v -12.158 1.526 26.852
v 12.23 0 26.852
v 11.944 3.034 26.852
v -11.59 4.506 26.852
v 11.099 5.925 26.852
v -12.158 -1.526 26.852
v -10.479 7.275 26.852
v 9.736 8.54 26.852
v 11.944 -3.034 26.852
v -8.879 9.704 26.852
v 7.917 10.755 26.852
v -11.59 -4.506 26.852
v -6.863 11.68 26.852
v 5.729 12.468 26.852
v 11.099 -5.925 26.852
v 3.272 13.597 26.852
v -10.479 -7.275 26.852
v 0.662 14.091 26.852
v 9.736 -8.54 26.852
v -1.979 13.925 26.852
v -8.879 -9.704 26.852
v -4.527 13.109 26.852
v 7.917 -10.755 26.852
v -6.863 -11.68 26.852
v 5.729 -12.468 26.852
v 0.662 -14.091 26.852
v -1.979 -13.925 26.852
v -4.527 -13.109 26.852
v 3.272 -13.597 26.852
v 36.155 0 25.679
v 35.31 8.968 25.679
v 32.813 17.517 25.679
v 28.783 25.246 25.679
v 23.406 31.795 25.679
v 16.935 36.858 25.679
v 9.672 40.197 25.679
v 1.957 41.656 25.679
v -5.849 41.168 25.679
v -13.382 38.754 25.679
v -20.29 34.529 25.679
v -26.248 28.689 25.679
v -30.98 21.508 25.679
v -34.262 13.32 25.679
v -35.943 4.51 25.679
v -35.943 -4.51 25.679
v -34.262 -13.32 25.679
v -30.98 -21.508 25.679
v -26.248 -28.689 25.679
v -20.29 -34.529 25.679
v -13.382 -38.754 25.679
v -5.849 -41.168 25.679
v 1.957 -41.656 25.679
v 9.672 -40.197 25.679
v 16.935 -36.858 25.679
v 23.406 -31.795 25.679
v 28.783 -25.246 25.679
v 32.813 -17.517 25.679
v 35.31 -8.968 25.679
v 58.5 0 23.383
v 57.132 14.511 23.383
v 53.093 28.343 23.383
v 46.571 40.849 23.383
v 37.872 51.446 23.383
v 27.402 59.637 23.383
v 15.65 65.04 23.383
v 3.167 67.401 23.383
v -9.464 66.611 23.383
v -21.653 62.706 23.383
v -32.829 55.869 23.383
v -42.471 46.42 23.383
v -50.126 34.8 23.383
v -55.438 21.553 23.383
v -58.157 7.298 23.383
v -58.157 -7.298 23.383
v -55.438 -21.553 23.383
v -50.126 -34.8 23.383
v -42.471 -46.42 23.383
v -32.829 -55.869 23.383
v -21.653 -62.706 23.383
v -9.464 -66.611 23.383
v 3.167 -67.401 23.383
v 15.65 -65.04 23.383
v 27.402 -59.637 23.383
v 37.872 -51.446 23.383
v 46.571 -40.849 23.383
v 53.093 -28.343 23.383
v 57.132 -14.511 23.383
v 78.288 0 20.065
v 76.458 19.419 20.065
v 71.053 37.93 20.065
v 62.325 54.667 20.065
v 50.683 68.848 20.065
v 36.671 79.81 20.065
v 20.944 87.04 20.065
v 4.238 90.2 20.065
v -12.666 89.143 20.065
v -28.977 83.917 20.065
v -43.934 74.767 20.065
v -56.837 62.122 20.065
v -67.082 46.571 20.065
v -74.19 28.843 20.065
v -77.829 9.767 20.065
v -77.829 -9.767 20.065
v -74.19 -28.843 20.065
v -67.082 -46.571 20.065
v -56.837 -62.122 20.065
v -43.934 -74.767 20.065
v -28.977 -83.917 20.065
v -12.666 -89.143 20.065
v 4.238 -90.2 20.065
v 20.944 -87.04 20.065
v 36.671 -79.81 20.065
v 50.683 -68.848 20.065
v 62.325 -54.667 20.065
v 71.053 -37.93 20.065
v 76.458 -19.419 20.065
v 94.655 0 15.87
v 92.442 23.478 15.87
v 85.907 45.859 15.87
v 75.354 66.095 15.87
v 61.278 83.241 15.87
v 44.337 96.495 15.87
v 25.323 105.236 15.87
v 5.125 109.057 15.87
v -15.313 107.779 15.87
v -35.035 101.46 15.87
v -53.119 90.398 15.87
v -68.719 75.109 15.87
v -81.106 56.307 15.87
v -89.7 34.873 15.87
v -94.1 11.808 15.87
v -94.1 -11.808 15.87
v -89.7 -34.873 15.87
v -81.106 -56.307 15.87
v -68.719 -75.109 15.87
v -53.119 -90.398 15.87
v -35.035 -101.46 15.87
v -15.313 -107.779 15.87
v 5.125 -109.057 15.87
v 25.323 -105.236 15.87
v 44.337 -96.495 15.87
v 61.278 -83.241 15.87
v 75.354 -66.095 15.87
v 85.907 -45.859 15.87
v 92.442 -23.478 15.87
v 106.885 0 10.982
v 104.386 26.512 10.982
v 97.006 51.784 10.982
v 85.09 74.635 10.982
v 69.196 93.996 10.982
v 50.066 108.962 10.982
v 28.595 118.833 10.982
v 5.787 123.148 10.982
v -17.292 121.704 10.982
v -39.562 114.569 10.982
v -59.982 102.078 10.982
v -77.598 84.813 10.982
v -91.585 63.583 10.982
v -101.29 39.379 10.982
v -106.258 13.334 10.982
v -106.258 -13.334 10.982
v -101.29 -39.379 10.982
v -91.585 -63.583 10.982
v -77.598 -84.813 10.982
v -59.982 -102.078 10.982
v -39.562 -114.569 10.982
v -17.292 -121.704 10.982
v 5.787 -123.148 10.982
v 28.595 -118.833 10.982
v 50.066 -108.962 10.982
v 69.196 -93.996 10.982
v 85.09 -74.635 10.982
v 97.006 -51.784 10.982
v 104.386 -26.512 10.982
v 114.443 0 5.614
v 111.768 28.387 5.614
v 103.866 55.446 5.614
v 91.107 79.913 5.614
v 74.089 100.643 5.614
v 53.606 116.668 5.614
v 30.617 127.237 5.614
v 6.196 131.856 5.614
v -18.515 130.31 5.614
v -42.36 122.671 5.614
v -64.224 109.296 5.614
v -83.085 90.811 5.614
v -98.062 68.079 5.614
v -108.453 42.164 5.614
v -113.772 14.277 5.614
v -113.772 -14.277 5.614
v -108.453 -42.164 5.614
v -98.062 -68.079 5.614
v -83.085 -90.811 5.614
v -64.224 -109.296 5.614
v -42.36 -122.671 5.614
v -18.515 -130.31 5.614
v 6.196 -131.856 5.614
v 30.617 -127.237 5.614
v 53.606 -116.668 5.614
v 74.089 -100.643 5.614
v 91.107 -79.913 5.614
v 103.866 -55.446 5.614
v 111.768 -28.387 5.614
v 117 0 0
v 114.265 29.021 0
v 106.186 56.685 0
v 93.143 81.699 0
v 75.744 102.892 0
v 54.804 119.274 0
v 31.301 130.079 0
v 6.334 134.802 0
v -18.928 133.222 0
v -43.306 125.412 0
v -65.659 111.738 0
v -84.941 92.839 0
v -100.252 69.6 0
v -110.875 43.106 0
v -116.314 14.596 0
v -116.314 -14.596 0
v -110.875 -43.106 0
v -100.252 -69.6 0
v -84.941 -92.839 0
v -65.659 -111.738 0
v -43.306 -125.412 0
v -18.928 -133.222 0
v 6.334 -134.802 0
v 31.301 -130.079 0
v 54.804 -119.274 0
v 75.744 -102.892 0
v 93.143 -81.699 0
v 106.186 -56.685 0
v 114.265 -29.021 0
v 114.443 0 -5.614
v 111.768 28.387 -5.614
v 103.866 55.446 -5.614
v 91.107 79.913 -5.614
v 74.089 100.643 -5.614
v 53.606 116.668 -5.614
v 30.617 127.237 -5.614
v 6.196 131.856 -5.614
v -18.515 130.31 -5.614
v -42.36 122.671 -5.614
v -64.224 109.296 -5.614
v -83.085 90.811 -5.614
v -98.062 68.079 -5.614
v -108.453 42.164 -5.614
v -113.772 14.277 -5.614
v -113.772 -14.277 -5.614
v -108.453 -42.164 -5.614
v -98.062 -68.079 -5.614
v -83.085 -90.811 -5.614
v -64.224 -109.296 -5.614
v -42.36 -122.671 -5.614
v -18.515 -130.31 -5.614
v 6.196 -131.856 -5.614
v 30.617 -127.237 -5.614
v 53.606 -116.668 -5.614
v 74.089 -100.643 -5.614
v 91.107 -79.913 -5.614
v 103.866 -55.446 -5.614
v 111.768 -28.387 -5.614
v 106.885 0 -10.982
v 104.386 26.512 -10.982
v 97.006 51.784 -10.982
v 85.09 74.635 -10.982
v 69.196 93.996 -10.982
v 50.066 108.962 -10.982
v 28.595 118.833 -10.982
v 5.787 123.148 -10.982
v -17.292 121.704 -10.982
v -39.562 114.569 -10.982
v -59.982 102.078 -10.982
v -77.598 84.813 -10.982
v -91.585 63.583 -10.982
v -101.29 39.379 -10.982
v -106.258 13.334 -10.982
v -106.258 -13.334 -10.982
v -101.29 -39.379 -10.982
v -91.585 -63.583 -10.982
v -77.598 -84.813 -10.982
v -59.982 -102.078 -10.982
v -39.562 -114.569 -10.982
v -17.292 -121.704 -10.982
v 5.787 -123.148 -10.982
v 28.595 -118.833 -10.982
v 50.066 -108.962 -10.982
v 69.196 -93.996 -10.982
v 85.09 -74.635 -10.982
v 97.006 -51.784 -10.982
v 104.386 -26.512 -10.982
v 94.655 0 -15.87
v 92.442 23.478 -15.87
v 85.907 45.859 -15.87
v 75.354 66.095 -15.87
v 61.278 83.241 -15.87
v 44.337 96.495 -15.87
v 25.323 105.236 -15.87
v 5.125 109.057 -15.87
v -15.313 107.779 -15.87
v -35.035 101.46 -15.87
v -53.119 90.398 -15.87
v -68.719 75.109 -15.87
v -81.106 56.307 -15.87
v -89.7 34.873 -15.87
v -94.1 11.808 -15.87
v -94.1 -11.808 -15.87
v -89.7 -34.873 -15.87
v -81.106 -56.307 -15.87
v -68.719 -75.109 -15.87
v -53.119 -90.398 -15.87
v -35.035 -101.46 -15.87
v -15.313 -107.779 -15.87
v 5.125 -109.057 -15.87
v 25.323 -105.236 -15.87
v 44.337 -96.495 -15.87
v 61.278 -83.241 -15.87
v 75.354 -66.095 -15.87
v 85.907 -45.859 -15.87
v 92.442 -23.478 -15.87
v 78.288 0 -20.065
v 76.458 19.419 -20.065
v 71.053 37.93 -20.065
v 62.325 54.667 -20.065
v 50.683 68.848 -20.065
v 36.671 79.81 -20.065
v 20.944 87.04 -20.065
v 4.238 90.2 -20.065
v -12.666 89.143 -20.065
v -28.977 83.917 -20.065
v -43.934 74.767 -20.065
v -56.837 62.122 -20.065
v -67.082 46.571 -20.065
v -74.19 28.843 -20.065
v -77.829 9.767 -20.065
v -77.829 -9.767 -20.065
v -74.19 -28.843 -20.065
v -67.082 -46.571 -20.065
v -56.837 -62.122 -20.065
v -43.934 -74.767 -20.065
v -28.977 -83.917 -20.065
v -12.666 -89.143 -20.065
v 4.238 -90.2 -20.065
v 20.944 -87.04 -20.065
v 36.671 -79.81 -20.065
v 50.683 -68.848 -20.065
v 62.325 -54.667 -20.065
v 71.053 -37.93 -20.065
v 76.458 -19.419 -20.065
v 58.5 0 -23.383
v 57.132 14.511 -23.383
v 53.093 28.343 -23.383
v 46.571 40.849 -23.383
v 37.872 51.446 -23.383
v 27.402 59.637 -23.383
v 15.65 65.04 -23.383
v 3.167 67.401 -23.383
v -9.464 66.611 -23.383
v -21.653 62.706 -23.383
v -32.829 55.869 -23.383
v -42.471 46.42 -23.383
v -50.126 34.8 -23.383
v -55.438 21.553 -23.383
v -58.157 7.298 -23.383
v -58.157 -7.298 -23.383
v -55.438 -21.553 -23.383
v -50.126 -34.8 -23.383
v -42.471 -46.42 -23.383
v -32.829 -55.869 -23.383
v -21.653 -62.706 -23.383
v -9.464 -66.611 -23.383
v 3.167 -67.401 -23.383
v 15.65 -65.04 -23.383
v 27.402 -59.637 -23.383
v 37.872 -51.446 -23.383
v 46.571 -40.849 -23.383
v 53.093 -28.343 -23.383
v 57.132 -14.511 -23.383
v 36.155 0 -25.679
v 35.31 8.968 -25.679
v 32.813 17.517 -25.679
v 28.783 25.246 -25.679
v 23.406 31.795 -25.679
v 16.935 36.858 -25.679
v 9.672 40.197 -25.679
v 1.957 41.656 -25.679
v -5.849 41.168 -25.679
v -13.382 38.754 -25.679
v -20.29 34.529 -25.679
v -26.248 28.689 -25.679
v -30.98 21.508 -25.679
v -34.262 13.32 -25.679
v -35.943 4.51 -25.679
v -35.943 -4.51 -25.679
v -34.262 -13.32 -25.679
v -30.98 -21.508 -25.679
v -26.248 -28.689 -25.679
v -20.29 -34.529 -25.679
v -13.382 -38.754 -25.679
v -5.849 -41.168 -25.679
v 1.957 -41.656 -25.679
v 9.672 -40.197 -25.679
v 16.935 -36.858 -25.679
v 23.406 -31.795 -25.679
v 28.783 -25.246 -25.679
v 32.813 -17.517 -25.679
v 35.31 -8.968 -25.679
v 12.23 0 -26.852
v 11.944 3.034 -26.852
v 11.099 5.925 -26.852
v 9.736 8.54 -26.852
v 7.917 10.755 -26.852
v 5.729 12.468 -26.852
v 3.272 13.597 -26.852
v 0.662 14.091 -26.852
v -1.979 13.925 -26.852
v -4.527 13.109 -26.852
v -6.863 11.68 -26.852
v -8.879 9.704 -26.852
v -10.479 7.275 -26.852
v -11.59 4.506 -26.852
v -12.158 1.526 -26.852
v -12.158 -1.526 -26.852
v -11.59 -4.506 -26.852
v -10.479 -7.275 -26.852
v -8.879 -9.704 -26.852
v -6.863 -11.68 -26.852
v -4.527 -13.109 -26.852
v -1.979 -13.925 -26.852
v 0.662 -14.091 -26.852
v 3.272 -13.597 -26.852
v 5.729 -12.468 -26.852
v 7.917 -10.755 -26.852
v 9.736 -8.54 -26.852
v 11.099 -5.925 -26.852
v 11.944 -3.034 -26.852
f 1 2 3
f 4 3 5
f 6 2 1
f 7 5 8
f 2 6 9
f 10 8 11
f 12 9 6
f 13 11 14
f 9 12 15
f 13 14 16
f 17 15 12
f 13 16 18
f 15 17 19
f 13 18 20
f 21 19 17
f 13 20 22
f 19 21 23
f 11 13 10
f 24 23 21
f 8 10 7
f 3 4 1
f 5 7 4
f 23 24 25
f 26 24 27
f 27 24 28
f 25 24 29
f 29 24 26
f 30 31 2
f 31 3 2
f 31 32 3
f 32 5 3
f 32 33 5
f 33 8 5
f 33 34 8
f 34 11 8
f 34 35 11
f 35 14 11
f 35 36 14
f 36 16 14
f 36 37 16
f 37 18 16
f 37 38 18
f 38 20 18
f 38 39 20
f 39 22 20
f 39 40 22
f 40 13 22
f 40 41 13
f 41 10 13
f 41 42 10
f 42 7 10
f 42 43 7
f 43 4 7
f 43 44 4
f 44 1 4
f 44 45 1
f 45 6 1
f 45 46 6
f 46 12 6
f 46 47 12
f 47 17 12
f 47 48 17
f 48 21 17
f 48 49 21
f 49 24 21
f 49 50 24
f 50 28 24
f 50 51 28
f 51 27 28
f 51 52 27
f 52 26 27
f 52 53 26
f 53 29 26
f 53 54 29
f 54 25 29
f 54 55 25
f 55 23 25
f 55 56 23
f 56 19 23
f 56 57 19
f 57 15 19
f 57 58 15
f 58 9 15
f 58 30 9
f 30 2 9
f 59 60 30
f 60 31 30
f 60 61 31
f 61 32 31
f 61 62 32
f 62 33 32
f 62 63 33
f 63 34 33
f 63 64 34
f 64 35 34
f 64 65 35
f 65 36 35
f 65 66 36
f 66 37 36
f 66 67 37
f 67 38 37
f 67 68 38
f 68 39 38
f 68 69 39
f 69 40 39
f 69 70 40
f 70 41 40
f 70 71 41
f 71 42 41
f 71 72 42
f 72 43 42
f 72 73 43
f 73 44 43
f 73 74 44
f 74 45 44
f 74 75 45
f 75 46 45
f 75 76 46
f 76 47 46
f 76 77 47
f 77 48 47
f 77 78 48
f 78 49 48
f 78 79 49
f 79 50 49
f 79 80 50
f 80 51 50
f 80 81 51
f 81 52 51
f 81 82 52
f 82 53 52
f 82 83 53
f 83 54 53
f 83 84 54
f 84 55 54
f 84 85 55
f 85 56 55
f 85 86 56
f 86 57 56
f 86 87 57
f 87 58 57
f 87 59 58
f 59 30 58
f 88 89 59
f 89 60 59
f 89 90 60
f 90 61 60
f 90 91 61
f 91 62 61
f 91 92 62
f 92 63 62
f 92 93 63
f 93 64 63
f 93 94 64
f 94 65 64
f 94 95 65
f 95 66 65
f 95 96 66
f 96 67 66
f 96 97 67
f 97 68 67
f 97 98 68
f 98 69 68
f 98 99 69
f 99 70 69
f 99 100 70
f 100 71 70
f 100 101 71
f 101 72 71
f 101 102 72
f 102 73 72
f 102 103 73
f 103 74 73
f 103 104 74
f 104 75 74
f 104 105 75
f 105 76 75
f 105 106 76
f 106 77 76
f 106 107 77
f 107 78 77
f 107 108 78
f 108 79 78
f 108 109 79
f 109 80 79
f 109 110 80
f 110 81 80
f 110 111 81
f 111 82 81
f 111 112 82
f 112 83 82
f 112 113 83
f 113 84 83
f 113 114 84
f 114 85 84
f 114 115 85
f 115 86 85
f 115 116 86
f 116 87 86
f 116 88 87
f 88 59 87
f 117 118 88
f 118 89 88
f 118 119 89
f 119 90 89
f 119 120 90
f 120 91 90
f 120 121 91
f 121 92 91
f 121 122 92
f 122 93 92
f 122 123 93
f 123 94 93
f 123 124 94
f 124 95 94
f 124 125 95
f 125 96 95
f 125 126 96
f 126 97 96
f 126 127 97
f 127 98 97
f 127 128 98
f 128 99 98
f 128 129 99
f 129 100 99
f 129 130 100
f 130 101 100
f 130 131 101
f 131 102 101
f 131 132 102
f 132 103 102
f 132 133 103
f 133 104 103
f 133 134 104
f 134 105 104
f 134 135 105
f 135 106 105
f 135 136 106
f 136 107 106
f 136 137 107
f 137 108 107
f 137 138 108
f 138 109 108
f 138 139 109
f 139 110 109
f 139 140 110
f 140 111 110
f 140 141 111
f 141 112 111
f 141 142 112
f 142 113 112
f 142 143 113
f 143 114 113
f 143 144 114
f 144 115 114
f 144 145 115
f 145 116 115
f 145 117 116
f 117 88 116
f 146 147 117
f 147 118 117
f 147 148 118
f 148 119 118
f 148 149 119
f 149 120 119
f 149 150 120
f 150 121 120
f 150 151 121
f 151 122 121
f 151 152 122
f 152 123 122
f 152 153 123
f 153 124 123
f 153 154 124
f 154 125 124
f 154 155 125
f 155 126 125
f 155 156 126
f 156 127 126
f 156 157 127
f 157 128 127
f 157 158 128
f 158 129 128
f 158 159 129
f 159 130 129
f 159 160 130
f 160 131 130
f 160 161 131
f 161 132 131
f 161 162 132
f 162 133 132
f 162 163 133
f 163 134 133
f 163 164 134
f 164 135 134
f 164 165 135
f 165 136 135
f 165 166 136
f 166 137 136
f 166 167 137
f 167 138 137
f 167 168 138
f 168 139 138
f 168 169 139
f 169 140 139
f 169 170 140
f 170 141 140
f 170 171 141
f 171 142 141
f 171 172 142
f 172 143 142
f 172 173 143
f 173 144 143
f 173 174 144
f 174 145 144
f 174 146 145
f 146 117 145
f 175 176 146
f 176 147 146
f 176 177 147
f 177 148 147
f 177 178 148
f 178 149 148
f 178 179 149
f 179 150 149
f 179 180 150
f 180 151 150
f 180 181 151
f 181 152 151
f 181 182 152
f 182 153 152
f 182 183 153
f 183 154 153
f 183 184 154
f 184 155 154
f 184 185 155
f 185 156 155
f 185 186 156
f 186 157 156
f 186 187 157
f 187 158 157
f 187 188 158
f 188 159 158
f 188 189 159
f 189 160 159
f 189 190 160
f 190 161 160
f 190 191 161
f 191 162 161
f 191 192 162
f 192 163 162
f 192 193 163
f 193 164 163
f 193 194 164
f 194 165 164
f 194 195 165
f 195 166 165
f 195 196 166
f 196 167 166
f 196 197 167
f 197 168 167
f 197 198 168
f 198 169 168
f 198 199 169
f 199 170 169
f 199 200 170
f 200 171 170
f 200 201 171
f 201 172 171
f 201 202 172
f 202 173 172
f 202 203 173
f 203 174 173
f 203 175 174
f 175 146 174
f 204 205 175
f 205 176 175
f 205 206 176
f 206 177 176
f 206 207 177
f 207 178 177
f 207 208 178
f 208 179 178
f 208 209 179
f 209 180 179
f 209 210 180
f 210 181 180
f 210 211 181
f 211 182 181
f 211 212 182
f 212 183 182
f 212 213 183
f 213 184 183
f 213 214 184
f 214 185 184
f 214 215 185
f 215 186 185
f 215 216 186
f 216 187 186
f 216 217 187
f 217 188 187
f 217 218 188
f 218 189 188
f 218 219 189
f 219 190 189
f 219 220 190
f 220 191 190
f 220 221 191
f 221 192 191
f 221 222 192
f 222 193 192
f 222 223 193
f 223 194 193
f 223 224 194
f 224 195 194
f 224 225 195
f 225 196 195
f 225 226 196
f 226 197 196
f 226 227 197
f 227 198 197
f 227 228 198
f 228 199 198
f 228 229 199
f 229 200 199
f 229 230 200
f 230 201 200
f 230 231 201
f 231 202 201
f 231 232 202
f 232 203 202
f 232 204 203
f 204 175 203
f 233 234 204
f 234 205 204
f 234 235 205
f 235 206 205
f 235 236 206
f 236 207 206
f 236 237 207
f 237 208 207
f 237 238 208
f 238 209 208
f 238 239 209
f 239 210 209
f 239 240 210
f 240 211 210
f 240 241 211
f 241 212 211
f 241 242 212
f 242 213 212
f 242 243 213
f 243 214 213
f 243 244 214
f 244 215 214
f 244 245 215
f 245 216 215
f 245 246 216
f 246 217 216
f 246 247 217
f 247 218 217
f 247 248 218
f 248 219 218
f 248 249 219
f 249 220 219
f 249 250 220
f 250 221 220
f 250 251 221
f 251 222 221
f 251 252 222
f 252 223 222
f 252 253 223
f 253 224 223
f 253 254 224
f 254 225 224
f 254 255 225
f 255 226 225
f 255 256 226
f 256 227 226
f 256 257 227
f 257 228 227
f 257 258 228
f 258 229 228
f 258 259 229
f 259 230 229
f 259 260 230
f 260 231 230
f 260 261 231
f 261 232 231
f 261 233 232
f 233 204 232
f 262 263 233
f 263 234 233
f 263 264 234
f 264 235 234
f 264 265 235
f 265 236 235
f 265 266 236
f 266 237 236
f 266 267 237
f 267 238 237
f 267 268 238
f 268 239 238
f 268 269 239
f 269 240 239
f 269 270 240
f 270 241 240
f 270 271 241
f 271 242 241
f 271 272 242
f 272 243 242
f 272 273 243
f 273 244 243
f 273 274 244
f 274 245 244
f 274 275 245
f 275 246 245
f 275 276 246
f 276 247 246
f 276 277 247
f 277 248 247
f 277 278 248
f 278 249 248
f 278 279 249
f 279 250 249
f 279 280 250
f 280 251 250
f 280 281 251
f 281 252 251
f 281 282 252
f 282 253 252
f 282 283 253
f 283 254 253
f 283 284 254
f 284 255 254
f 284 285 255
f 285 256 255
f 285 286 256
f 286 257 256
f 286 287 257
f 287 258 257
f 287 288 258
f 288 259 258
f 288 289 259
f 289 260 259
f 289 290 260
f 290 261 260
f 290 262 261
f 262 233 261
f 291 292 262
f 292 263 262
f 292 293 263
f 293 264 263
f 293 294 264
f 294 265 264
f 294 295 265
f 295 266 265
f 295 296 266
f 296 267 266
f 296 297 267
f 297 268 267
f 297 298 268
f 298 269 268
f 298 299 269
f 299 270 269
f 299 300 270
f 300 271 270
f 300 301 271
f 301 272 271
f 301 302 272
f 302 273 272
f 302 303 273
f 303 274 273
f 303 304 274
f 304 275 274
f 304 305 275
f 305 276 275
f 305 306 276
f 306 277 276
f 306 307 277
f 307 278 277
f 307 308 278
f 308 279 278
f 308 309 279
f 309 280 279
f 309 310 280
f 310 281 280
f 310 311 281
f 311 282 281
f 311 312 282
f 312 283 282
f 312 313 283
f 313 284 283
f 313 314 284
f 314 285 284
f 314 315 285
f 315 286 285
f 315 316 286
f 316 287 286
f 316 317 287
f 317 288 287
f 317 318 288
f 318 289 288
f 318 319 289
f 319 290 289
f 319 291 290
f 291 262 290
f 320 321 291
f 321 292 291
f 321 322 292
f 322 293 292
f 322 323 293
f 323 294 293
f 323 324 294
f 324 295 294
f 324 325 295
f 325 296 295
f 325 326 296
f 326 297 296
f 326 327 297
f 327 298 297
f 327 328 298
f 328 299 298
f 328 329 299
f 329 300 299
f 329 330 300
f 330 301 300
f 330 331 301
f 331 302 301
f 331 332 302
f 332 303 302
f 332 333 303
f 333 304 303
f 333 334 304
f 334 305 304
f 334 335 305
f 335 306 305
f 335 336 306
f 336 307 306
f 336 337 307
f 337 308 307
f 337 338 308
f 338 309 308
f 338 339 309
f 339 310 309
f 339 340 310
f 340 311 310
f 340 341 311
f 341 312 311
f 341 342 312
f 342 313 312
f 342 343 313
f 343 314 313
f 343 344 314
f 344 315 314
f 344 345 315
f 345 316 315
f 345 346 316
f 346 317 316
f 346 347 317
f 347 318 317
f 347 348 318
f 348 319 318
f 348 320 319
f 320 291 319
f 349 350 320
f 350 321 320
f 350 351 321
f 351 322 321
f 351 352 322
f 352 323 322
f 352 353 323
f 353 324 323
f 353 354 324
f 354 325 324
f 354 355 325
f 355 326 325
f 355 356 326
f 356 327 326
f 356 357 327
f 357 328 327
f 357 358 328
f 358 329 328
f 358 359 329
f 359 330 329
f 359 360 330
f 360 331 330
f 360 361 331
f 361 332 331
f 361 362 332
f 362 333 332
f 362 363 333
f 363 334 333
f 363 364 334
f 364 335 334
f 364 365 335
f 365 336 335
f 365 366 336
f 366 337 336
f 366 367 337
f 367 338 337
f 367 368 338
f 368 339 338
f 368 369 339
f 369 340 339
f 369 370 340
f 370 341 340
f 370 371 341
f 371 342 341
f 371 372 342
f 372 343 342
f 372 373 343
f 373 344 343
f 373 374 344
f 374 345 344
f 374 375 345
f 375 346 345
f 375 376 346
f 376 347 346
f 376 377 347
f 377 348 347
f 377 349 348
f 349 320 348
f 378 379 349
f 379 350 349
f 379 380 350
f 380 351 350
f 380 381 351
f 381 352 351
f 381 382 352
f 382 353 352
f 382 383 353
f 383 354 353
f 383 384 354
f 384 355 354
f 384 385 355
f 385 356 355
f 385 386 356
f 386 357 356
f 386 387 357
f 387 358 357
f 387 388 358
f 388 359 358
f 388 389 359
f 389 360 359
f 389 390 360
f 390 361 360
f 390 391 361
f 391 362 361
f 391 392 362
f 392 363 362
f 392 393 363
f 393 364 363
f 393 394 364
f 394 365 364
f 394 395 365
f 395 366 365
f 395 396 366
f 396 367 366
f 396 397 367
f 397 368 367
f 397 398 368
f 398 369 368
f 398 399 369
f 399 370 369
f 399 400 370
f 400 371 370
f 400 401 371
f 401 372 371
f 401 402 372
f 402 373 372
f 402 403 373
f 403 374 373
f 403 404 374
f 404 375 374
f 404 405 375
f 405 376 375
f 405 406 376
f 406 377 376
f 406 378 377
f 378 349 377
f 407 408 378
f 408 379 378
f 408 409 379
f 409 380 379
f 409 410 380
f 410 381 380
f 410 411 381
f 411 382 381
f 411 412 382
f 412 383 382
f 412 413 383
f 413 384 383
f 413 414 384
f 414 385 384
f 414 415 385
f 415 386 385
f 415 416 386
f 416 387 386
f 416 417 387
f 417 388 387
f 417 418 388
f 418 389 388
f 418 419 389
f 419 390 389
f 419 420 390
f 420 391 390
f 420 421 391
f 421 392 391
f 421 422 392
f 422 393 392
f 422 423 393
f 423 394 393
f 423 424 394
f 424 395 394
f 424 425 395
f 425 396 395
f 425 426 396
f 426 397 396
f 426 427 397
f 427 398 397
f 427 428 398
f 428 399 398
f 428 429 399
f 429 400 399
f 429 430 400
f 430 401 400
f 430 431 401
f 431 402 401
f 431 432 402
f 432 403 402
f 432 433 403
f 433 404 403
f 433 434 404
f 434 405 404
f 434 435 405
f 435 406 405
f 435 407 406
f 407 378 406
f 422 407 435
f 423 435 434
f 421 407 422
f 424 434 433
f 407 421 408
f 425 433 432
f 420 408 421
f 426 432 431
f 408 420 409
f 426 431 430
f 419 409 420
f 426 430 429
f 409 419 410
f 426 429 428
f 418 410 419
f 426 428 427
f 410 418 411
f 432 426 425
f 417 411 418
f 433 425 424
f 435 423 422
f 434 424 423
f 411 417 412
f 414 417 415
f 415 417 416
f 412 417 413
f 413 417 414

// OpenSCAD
// Generated by SolidPython 1.0.1 on 2020-07-29 00:46:51


scale(v = [13, 15, 3]) {
	sphere(r = 9);
}
/***********************************************
*********      SolidPython code:      **********
************************************************
 
# import packages: SolidPython
from solid import *
from solid.utils import *
from itertools import chain, combinations, permutations


class Resize:

    def __init__(self, scad_file):
        self.scad_file = scad_file
        #self.scad_file = import_scad(scad_file)
        # cone/cylinder param:
        self.r1 = 0
        self.r2 = 0
        self.h = 0
        # rectangular prism param:
        self.w = 0
        self.l = 0
        # ellipse param:
        self.r = 0

    # import OpenScad code (file name corresponds to shape)


    # classify shape + parameters
    def assign(self, param1, param2, param3):
        if self.scad_file == 'cone.scad':
            self.r1 = param1
            self.r2 = param2
            self.h = param3
        elif self.scad_file == 'cylinder.scad':
            self.r1 = param1
            self.r2 = param2
            self.h = param3
        elif self.scad_file == 'rectangularPrism.scad':
            self.h = param1
            self.l = param2
            self.w = param3
        else:
            self.r = param1
            self.h = param2

    # resize parameters
    def iterate(self):
        x = range(3, 20, 2)
        i = 1
        if self.scad_file == 'cone.scad':
            tempList = list(permutations(x, 2))
            for temp in tempList:
                param1 = temp[0]
                param2 = temp[1]
                filepath = 'produced_scad_files/' + 'cone' + str(param1) + '_' + str(param2) + '_' + '.scad'
                scad_render_to_file(cylinder(h=param1, r1=param2, r2=0), filepath)

        elif self.scad_file == 'cylinder.scad':
            tempList = list(permutations(x, 3))
            for temp in tempList:
                param1 = temp[0]
                param2 = temp[1]
                filepath = 'produced_scad_files/' + 'cylinder' + str(param1) + '_' + str(param2) + '_' + '.scad'
                scad_render_to_file(cylinder(h=param1, r1=param2, r2=param2), filepath)

        elif self.scad_file == 'rectangularPrism.scad':
            tempList = list(permutations(x, 3))
            for temp in tempList:
                param1 = temp[0]
                param2 = temp[1]
                param3 = temp[2]
                filepath = 'produced_scad_files/' + 'rectangularPrism' + str(param1) + '_' + str(param2) + '_' + str(
                    param3) + '.scad'
                scad_render_to_file(cube(size=(param1, param2, param3)), filepath)

        elif self.scad_file == 'ellipse.scad':
            tempList = list(permutations(x, 4))
            for temp in tempList:
                param1 = temp[0]
                param2 = temp[1]
                param3 = temp[2]
                param4 = temp[3]
                filepath = 'produced_scad_files/' + 'ellipse' + str(param1) + '_' + str(param2) + '_' + str(param3) + '_' + str(param4) + '.scad'
                scad_render_to_file(scale([param1, param2, param3])(sphere(r=param4)), filepath)

    def render_to_scadfile(self):
        scad_render_to_file(scad, 'example.scad') 
 
************************************************/
